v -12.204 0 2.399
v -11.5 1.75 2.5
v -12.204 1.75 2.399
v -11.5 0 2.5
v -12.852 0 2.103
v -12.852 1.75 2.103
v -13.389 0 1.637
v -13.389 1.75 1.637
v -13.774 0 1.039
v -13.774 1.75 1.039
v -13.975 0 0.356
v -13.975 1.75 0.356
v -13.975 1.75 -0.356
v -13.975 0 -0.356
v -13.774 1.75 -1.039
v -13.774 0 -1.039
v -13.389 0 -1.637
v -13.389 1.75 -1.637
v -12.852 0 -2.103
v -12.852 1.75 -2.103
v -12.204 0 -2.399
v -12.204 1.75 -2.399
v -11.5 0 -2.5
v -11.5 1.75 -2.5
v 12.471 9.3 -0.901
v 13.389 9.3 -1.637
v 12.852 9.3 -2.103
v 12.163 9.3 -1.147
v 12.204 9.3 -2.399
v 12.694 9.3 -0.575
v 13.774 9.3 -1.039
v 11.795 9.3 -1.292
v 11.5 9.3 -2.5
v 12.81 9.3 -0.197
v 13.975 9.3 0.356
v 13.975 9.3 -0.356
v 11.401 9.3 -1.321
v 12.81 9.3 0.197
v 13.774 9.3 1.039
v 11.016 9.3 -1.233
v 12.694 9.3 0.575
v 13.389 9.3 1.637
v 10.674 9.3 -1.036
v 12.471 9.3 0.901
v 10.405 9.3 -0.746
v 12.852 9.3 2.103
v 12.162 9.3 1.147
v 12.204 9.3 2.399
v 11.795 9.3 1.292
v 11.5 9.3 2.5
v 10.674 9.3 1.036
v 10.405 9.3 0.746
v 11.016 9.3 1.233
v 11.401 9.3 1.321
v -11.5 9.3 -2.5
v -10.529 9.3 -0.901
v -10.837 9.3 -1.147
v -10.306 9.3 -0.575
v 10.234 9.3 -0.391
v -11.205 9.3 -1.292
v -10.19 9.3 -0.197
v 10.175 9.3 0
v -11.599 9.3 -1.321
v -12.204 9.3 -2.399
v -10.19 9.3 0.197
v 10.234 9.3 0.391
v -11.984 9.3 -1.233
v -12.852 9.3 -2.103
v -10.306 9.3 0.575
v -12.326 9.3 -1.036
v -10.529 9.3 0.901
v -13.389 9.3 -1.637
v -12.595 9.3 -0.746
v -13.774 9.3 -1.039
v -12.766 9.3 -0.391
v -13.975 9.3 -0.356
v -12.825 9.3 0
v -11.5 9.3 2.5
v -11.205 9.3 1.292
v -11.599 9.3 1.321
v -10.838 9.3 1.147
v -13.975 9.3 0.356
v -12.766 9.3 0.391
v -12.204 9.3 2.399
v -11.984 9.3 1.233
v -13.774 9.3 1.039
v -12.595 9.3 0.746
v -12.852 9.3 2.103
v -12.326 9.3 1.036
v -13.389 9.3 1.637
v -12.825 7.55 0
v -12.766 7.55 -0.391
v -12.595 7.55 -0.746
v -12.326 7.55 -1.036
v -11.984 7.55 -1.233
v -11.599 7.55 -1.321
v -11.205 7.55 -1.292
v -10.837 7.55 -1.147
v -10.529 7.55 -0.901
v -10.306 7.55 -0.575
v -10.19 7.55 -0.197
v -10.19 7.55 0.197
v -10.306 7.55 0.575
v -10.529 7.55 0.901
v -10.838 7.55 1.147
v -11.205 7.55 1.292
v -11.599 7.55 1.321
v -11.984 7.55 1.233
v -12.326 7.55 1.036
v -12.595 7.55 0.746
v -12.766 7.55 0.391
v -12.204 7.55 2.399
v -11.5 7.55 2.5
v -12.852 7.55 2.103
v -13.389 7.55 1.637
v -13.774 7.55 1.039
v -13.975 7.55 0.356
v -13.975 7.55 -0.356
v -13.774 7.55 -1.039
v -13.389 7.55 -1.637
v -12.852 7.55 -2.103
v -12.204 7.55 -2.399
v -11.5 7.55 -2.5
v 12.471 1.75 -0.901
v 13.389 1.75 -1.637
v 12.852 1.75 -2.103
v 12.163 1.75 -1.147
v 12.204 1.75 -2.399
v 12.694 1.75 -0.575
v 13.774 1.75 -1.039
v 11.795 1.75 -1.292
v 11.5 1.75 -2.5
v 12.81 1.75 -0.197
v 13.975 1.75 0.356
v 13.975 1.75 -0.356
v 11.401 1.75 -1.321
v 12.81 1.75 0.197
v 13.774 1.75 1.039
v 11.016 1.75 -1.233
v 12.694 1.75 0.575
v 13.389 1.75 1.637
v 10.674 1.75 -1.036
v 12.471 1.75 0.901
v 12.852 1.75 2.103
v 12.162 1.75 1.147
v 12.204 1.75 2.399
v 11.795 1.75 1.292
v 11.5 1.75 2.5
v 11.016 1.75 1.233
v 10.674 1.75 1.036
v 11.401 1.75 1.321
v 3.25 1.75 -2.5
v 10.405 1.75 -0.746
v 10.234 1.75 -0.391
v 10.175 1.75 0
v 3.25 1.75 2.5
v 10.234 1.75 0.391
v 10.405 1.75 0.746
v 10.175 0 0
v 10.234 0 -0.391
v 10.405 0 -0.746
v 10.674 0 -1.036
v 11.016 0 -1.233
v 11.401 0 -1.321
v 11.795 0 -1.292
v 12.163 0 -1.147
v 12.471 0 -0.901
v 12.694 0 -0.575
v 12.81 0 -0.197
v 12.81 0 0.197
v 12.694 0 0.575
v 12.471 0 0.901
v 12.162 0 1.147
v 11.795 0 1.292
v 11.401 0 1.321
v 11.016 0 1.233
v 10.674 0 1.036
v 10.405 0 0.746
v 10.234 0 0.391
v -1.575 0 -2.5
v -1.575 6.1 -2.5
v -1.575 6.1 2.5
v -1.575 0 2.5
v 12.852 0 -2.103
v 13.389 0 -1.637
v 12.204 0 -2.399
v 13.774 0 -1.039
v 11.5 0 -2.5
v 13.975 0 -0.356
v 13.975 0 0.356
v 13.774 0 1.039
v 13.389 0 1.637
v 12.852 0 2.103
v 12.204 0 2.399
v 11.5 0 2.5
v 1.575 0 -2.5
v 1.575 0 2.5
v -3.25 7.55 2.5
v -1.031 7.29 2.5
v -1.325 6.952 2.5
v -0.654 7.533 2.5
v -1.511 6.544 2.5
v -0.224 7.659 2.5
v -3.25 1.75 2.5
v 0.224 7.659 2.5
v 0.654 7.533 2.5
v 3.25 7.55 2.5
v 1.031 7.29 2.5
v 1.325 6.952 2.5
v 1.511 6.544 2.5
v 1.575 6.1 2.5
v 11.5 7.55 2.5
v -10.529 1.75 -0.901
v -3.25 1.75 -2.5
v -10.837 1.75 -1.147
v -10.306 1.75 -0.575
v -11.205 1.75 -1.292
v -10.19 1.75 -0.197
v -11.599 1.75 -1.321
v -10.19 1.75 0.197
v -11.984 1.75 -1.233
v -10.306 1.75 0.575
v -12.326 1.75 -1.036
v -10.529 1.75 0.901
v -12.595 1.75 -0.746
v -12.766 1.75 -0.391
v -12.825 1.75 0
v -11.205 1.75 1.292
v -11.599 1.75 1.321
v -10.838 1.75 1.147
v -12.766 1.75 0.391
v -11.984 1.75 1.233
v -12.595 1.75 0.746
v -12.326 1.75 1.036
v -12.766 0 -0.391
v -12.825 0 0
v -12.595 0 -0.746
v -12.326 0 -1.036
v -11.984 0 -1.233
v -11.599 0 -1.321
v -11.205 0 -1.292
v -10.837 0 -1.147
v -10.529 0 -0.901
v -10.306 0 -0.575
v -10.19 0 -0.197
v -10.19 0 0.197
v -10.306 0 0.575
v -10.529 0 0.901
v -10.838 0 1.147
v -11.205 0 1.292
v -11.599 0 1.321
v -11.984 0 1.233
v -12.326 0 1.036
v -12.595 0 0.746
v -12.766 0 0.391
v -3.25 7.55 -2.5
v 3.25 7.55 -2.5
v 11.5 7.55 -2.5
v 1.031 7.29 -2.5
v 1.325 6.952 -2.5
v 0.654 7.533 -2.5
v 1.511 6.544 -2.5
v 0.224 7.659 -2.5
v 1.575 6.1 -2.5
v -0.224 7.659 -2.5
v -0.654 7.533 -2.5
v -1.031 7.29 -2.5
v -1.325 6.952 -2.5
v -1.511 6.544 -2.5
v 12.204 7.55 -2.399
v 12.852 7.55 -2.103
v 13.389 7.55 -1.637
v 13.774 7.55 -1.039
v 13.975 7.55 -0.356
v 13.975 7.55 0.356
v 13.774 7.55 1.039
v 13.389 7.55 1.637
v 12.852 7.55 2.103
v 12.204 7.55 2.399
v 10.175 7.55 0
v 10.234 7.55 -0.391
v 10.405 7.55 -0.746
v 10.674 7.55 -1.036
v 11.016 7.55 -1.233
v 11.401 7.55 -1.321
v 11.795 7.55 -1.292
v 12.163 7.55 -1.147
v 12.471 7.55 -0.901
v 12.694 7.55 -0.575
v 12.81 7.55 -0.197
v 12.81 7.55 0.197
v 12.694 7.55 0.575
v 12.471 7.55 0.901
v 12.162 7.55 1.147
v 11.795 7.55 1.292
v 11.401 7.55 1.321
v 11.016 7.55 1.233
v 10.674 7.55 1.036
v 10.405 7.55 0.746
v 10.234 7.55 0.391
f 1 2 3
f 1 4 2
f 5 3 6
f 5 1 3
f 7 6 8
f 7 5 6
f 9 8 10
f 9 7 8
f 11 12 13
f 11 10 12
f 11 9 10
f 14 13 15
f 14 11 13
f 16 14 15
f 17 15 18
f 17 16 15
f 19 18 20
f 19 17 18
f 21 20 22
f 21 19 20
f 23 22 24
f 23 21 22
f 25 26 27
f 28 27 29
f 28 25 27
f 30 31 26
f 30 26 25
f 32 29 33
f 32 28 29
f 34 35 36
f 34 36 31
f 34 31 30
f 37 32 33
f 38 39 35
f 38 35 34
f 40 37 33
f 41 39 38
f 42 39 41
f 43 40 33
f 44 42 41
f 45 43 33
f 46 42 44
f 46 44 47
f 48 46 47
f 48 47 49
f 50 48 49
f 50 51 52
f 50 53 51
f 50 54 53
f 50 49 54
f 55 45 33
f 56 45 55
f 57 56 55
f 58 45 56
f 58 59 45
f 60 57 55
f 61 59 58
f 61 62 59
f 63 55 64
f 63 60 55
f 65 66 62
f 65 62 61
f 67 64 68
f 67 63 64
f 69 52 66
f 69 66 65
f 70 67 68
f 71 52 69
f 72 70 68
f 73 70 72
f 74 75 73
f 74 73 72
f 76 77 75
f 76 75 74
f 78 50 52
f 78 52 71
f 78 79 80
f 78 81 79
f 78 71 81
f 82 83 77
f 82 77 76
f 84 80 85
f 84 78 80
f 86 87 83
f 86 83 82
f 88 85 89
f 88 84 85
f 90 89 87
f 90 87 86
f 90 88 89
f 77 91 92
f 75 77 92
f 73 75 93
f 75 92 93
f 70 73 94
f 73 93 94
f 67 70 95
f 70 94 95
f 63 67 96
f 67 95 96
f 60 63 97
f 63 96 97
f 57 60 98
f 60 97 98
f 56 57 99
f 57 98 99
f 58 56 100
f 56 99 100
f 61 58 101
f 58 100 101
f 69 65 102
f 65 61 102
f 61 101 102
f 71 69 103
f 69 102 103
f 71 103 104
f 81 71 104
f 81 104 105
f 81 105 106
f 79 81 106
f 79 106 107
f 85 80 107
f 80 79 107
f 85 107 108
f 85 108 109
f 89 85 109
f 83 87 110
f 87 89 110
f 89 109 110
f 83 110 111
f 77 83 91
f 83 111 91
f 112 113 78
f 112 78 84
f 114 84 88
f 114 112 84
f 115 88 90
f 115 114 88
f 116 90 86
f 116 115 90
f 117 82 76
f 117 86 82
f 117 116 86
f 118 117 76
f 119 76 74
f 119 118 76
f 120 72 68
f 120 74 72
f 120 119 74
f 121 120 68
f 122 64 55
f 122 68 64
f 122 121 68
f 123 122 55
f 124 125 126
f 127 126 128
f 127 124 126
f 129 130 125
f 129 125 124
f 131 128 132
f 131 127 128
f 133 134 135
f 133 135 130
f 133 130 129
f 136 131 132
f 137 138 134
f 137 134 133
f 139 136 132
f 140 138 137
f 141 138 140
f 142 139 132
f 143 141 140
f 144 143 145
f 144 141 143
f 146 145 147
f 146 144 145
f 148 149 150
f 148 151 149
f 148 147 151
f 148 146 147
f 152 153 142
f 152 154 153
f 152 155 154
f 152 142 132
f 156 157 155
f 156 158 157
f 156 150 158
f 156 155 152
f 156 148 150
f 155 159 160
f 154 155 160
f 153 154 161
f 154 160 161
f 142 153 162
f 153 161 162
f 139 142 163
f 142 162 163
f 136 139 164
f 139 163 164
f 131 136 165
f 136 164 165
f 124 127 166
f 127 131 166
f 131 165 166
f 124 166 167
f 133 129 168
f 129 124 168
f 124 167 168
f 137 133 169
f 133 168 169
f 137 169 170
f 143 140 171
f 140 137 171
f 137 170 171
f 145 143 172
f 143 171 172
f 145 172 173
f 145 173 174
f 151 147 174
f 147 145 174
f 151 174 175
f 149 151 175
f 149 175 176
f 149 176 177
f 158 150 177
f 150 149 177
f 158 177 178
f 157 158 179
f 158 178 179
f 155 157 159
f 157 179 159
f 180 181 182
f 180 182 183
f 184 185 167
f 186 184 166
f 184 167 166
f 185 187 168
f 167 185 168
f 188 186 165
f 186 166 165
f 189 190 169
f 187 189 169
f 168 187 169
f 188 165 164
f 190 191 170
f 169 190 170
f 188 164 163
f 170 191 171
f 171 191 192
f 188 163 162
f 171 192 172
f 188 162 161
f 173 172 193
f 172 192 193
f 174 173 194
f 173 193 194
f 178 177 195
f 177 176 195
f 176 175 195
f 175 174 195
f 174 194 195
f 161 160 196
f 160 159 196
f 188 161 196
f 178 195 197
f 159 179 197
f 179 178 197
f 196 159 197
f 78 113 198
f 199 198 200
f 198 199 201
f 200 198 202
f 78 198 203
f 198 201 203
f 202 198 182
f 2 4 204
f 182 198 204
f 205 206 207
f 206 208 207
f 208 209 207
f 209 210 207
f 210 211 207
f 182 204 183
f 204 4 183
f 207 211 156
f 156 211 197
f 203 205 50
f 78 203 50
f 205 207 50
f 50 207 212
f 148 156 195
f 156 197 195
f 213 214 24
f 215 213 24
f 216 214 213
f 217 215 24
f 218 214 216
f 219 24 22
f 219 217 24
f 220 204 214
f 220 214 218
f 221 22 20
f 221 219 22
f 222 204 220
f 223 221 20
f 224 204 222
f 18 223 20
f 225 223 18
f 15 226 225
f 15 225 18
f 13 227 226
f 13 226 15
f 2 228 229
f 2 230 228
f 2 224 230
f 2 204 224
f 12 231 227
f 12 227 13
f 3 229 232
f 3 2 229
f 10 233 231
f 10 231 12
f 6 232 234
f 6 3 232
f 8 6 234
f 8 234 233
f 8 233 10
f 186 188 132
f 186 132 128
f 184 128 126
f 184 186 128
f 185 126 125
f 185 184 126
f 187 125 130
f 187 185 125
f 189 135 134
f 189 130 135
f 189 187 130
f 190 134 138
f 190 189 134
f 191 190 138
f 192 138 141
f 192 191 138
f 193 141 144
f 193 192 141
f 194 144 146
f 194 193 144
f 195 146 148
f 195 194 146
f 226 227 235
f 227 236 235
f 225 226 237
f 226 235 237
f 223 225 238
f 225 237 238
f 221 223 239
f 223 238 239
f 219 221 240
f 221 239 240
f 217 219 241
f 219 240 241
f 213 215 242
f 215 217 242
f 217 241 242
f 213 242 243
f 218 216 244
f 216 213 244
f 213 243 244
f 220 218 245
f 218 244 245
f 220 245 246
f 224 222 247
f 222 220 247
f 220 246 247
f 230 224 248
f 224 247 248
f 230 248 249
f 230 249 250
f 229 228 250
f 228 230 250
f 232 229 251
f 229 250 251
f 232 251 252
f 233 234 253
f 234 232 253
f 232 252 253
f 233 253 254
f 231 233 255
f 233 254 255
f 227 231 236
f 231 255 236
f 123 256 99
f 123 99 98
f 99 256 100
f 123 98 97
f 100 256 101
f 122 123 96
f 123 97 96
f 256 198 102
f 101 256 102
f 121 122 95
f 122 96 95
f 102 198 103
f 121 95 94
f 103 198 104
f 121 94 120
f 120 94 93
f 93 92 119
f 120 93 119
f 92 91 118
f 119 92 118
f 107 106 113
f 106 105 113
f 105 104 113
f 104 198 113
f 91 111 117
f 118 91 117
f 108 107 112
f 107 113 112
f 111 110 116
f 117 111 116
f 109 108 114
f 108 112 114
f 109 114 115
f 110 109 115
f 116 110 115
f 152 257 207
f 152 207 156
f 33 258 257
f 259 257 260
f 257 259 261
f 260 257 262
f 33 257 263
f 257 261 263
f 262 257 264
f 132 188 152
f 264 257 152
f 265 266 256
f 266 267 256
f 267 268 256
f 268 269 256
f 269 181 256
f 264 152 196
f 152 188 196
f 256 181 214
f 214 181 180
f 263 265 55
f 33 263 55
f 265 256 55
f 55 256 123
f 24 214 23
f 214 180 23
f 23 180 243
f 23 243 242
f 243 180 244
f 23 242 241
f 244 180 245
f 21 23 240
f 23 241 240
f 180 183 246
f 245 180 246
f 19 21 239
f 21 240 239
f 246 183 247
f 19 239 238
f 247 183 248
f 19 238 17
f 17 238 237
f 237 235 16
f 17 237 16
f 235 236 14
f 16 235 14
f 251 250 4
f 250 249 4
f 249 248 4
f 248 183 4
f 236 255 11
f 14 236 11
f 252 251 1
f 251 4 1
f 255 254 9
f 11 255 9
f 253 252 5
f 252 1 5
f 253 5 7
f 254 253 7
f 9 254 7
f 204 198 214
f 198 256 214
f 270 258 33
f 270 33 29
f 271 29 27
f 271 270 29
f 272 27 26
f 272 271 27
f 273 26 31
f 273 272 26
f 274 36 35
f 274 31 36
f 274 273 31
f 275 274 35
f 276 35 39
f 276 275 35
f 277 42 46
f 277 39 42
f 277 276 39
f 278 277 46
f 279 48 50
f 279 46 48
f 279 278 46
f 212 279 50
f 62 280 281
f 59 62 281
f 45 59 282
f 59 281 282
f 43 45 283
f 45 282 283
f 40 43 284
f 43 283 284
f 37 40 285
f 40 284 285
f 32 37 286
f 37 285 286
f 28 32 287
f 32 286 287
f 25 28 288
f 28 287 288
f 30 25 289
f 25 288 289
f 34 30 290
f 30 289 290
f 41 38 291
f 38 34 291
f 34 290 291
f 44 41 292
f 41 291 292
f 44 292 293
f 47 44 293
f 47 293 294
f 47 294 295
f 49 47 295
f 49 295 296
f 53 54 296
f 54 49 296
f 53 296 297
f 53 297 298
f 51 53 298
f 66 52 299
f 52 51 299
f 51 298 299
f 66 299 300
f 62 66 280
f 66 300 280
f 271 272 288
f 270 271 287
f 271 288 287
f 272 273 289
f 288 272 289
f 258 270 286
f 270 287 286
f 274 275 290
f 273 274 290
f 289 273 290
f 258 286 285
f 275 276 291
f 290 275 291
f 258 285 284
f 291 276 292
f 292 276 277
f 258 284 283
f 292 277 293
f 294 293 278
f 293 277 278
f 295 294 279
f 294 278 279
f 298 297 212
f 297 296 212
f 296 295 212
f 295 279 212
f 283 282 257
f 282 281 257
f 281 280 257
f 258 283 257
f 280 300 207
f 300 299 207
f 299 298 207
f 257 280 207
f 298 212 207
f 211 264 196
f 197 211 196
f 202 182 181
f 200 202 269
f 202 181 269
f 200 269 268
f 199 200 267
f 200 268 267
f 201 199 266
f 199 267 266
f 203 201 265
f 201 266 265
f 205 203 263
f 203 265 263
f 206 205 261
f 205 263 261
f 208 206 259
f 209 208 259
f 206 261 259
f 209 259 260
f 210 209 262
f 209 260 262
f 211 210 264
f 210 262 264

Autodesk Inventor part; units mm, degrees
ref_plane "YZ Plane" through (0, 0, 0) normal (1, 0, 0) x (0, 1, 0)
ref_plane "XZ Plane" through (0, 0, 0) normal (0, 1, 0) x (-1, 0, 0)
ref_plane "XY Plane" through (0, 0, 0) normal (0, 0, 1) x (1, 0, 0)
sketch "Эскиз1" plane through (0, 0, 0) normal (0, 1, 0) x (-1, 0, 0)
  line L0 (11.5, 0) -> (-11.5, 0) construction
  line L1 (11.5, 2.5) -> (-11.5, 2.5)
  line L2 (-11.5, -2.5) -> (11.5, -2.5)
  arc A0 (11.5, -2.5) -> (11.5, 2.5) centre (11.5, 0) ccw
  arc A1 (-11.5, 2.5) -> (-11.5, -2.5) centre (-11.5, 0) ccw
  circle A2 centre (11.5, 0) radius 1.325
  circle A3 centre (-11.5, 0) radius 1.325
  line L3 (16.5, 7.5) -> (-6.5, 7.5)
  line L4 (-6.5, 2.5) -> (16.5, 2.5)
  arc A4 (16.5, 2.5) -> (16.5, 7.5) centre (16.5, 5) ccw
  arc A5 (-6.5, 7.5) -> (-6.5, 2.5) centre (-6.5, 5) ccw
  line L5 (11.5, 0) -> (16.5, 5) construction
  point P0 (0, 0)
  point P1 (0, 0)
  point P2 (-14, 0)
  point P3 (14, 0)
  point P4 (-9, 5)
  point P5 (19, 5)
  dimension "d0" = 2.65
  dimension "d1" = 2.65
  dimension "d2" = 2.5
  dimension "d6" = 2.5
  dimension "d12" = 45
  dimension "d16" = 23
  dimension "d28" = 5
  dimension "d29" = 7.0711
extrude "Выдавливание1" add sketch "Эскиз1" along normal blind 1.75 contours A0 L2 A1 L1
pattern_linear "Прямоуг.массив1" count 2 spacing 7.55 along (0, 1, 0) of "Выдавливание1"
sketch "Эскиз2" plane through (0, 0, 0) normal (0, 0, 1) x (1, 0, 0)
  arc A0 (1.575, 6.1) -> (-1.575, 6.1) centre (0, 6.1) ccw
  line L0 (-11.5, 9.3) -> (11.5, 9.3) projected
  line L1 (-11.5, 0) -> (11.5, 0) projected
  line L2 (-1.575, 6.1) -> (-1.575, 0)
  line L3 (1.575, 6.1) -> (1.575, 0)
  line L4 (11.5, 7.55) -> (-11.5, 7.55) projected
  line L5 (-3.25, 7.55) -> (-3.25, 0)
  line L6 (3.25, 7.55) -> (3.25, 0)
  line L7 (0, -1.86) -> (0, 11.16) construction
  point P0 (0.6149, 7.55)
  point P1 (-0.6149, 7.55)
  dimension "d21" = 3.15
  dimension "d33" = 3.2
  dimension "d34" = 3.25
  dimension "d35" = 3.25
extrude "Выдавливание2" cut sketch "Эскиз2" along normal mid plane 5 contours L3 L1 L2 A0 L4 | L4 A0
extrude "Выдавливание3" add sketch "Эскиз2" along normal mid plane 5 contours A0 L4 L6 L1 L3 | A0 L2 L1 L5 L4
properties part number "Чертёж"
